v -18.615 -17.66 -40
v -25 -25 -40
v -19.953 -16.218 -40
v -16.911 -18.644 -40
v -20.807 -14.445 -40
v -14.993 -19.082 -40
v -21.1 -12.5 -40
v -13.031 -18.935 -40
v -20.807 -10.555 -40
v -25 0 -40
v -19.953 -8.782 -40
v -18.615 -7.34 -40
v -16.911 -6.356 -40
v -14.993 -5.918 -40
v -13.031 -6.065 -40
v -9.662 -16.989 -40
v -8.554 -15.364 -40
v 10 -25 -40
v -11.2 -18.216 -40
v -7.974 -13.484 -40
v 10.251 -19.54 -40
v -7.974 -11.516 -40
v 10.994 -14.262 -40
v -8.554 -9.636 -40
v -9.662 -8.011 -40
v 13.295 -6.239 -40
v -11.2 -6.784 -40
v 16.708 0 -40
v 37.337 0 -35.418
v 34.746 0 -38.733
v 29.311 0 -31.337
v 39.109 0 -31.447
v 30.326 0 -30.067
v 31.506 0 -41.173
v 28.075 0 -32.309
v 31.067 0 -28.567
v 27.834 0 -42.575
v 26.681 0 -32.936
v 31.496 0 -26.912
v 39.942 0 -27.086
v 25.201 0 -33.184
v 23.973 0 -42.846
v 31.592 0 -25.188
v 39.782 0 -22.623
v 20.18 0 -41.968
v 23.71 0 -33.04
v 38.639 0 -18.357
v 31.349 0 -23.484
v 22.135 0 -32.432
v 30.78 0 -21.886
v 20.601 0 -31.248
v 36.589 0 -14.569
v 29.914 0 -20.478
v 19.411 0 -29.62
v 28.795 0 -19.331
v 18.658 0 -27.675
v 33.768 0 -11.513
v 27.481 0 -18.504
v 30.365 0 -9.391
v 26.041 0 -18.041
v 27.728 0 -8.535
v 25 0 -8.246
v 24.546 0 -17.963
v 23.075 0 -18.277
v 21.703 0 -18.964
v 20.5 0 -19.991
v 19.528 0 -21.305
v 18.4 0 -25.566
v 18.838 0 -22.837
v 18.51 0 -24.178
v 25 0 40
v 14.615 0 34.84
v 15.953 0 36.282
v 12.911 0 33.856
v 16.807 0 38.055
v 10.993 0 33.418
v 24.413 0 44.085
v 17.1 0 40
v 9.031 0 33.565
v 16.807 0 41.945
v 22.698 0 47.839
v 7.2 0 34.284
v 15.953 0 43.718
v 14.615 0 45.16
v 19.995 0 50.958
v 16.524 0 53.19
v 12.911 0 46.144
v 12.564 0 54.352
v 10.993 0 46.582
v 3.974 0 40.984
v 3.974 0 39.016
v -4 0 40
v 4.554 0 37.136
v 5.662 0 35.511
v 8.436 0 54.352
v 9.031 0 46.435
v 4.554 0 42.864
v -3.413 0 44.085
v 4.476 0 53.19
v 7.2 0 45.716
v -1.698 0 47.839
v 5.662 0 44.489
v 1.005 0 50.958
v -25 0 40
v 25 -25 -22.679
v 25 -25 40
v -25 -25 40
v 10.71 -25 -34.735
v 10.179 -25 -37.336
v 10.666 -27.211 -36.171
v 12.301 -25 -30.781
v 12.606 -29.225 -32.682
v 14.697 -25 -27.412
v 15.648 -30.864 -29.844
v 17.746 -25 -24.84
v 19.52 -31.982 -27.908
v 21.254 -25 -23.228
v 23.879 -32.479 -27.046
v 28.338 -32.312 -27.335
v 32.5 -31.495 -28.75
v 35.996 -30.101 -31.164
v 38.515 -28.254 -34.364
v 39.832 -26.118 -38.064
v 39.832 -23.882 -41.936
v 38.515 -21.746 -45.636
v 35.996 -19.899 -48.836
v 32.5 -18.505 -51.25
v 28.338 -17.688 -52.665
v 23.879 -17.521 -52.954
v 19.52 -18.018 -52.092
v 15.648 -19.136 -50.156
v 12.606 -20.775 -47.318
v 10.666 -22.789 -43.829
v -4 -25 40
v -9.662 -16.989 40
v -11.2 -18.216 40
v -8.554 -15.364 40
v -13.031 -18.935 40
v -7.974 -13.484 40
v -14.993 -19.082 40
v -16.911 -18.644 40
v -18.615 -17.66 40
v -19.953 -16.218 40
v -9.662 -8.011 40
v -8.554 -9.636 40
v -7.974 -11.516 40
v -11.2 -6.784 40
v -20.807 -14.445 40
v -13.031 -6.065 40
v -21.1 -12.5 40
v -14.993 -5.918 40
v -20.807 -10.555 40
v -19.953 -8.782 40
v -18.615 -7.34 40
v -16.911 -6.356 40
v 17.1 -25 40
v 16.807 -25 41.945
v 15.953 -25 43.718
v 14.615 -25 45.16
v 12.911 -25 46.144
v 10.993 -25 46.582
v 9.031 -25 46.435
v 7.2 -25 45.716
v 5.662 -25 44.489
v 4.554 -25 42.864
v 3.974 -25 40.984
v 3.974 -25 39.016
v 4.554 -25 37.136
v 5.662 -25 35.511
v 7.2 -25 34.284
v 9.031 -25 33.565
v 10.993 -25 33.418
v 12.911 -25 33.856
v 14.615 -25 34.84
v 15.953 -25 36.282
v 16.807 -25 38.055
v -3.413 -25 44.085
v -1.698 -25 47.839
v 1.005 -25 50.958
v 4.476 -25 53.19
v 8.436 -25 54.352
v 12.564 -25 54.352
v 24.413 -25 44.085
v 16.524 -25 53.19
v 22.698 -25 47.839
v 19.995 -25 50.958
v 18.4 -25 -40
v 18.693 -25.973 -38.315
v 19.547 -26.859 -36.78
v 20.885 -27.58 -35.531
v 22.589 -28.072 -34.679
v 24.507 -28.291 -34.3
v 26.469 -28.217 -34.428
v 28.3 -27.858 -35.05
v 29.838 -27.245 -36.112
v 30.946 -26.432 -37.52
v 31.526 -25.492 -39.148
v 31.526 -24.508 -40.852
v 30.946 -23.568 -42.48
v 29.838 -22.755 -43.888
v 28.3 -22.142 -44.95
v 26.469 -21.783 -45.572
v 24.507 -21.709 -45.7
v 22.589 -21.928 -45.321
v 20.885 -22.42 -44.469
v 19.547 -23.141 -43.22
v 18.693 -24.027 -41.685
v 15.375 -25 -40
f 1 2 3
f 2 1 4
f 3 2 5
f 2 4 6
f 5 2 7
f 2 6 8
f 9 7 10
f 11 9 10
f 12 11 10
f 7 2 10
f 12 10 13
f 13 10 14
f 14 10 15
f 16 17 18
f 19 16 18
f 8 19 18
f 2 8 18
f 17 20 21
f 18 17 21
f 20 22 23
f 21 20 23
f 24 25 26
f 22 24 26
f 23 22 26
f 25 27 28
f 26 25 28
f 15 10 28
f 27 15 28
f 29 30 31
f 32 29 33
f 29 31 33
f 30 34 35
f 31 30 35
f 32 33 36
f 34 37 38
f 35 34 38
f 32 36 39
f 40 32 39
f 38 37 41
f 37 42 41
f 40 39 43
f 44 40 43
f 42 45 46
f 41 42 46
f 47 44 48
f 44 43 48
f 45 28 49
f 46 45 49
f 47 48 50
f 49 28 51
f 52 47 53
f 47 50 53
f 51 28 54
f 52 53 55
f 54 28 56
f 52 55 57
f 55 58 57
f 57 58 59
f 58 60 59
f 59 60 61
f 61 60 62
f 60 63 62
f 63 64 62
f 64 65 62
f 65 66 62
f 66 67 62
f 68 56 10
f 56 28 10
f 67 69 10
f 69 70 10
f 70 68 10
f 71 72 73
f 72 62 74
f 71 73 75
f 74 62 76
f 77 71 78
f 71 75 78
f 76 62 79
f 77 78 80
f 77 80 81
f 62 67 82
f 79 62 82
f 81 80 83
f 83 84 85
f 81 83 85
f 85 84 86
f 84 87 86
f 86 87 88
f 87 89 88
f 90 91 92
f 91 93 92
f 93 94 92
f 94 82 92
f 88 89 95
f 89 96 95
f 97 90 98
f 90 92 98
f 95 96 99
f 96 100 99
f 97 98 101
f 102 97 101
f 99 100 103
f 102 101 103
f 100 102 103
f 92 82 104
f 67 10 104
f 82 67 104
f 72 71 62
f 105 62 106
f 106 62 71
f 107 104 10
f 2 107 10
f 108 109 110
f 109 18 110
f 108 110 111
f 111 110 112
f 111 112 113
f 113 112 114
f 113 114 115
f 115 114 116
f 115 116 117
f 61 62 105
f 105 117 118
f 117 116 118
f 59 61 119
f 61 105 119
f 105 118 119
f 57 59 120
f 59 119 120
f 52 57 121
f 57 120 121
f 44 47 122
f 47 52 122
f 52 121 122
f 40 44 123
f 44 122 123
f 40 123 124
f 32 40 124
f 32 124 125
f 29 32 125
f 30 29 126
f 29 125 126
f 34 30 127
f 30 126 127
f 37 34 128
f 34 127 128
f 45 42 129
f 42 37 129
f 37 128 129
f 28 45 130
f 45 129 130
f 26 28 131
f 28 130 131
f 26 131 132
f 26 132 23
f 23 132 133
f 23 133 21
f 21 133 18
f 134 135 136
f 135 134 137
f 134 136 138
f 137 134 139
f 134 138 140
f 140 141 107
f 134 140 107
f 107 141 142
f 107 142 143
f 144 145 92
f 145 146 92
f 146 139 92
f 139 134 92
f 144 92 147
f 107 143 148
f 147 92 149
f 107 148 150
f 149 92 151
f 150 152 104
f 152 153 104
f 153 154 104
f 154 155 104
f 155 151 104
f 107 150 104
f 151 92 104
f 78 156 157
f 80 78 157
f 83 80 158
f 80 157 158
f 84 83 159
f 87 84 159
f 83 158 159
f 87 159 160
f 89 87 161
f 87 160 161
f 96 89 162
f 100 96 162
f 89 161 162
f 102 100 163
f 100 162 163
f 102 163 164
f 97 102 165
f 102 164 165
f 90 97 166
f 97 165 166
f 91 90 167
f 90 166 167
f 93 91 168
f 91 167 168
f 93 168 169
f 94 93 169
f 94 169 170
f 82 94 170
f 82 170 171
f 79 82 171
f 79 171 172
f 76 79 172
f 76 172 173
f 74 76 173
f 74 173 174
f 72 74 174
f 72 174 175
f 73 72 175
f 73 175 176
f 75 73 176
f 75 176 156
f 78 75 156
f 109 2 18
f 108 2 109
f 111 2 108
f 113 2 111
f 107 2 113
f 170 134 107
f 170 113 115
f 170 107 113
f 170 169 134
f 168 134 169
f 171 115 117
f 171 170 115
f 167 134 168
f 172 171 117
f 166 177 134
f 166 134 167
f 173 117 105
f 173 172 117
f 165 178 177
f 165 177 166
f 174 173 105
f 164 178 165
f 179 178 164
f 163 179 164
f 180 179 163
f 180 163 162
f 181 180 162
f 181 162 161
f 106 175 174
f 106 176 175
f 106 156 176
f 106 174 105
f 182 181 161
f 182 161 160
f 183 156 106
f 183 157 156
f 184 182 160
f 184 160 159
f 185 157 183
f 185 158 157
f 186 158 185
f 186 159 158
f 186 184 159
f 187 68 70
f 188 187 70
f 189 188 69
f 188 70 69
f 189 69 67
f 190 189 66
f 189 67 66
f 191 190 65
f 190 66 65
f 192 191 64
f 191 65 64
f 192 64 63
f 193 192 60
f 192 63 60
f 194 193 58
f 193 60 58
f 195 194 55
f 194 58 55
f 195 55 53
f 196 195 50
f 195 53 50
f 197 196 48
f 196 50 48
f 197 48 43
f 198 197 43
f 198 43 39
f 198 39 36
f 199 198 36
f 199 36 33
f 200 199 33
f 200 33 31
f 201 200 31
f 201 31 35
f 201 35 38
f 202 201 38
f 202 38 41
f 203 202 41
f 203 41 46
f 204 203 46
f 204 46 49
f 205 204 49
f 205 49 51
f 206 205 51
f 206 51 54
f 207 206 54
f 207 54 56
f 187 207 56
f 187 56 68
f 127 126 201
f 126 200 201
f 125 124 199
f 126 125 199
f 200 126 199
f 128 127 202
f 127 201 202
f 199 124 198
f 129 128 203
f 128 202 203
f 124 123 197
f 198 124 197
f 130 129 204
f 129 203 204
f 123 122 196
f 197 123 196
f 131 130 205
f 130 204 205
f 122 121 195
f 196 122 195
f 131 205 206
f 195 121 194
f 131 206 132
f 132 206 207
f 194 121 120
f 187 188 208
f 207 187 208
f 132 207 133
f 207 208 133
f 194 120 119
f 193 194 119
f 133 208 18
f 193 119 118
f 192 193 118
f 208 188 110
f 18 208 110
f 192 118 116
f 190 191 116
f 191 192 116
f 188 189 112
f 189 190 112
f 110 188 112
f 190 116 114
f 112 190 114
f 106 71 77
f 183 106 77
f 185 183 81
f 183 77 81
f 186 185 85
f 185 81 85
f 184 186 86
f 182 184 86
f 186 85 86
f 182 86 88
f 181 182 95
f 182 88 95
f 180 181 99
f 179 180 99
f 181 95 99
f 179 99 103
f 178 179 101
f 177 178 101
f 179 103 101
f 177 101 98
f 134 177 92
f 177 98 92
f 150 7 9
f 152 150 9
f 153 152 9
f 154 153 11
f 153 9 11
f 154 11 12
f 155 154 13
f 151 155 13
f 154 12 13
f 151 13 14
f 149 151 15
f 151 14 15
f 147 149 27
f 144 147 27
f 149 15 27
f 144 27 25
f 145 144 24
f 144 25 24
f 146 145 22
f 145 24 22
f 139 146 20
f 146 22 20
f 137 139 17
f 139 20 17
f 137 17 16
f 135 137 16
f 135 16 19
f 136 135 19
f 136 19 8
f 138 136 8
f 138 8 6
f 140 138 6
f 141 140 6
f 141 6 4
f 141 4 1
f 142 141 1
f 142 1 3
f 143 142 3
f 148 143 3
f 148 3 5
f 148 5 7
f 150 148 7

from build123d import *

# Parameters (mm, degrees)
F1_DEPTH        = 25
F3_D            = 13.2
F3_CBORE_D      = 19.25
F3_CBORE_DEPTH  = 0
F4_W            = 24.2927655578
F4_H            = 50
F5_DEPTH        = 60
F7_D            = 13.2
F7_CBORE_D      = 19.25
F7_CBORE_DEPTH  = 0
F9_R            = 15
F10_DEPTH       = 52
F12_D           = 13.2
F12_CBORE_D     = 19.25
F12_CBORE_DEPTH = 0
F13_W           = 29.7532882541
F13_H           = 56.5460538492
F14_DEPTH       = 50


with BuildPart() as f1:
    # F0 (on Front) → F1 (new body)
    with BuildSketch(Plane.XZ):
        with BuildLine():
            Line((-25, -40), (25, -40))
            Line((25, -40), (25, 40))
            ThreePointArc((25, 40), (10.5, 25.5), (-4, 40))
            Line((-4, 40), (-25, 40))
            Line((-25, 40), (-25, -40))
        make_face()
        with BuildLine():
            ThreePointArc((-4, 40), (10.5, 25.5), (25, 40))
            Line((25, 40), (-4, 40))
        make_face()
        with BuildLine():
            Line((-4, 40), (25, 40))
            ThreePointArc((25, 40), (10.5, 54.5), (-4, 40))
        make_face()
    extrude(amount=F1_DEPTH)

    # F3 (through all)
    with Locations(Plane(origin=(0, 0, 0), x_dir=(-1, 0, 0), z_dir=(0, 1, 0))):
        with Locations((-10.5, 40)):
            CounterBoreHole(F3_D / 2, F3_CBORE_D / 2, F3_CBORE_DEPTH)

    # F4 (on Right) → F5 (cut)
    with BuildSketch(Plane.YZ):
        with Locations((-37.1463827789, -15)):
            Rectangle(F4_W, F4_H)
    extrude(amount=F5_DEPTH, mode=Mode.SUBTRACT)

    # F7 (through all)
    with Locations(Plane.XY.offset(40)):
        with Locations((-14.5, -12.5)):
            CounterBoreHole(F7_D / 2, F7_CBORE_D / 2, F7_CBORE_DEPTH)

    # F9 (on face) → F10 (join)
    with BuildSketch(Plane(origin=(0, -36.0705080757, -20.8253175473), x_dir=(-1, 0, 0), z_dir=(0, 0.8660254038, 0.5))):
        with Locations((-25, -22.1410161514)):
            Circle(F9_R)
    extrude(amount=F10_DEPTH)

    # F12 (through all)
    with Locations(Plane(origin=(0, -36.0705080757, -20.8253175473), x_dir=(1, 0, 0), z_dir=(0, -0.8660254038, -0.5))):
        with Locations((25, -22.1410161514)):
            CounterBoreHole(F12_D / 2, F12_CBORE_D / 2, F12_CBORE_DEPTH)

    # F13 (on Right) → F14 (cut)
    with BuildSketch(Plane.YZ):
        with Locations((14.8766441271, -15.394736547)):
            Rectangle(F13_W, F13_H)
    extrude(amount=F14_DEPTH, mode=Mode.SUBTRACT)


solid = f1.part
